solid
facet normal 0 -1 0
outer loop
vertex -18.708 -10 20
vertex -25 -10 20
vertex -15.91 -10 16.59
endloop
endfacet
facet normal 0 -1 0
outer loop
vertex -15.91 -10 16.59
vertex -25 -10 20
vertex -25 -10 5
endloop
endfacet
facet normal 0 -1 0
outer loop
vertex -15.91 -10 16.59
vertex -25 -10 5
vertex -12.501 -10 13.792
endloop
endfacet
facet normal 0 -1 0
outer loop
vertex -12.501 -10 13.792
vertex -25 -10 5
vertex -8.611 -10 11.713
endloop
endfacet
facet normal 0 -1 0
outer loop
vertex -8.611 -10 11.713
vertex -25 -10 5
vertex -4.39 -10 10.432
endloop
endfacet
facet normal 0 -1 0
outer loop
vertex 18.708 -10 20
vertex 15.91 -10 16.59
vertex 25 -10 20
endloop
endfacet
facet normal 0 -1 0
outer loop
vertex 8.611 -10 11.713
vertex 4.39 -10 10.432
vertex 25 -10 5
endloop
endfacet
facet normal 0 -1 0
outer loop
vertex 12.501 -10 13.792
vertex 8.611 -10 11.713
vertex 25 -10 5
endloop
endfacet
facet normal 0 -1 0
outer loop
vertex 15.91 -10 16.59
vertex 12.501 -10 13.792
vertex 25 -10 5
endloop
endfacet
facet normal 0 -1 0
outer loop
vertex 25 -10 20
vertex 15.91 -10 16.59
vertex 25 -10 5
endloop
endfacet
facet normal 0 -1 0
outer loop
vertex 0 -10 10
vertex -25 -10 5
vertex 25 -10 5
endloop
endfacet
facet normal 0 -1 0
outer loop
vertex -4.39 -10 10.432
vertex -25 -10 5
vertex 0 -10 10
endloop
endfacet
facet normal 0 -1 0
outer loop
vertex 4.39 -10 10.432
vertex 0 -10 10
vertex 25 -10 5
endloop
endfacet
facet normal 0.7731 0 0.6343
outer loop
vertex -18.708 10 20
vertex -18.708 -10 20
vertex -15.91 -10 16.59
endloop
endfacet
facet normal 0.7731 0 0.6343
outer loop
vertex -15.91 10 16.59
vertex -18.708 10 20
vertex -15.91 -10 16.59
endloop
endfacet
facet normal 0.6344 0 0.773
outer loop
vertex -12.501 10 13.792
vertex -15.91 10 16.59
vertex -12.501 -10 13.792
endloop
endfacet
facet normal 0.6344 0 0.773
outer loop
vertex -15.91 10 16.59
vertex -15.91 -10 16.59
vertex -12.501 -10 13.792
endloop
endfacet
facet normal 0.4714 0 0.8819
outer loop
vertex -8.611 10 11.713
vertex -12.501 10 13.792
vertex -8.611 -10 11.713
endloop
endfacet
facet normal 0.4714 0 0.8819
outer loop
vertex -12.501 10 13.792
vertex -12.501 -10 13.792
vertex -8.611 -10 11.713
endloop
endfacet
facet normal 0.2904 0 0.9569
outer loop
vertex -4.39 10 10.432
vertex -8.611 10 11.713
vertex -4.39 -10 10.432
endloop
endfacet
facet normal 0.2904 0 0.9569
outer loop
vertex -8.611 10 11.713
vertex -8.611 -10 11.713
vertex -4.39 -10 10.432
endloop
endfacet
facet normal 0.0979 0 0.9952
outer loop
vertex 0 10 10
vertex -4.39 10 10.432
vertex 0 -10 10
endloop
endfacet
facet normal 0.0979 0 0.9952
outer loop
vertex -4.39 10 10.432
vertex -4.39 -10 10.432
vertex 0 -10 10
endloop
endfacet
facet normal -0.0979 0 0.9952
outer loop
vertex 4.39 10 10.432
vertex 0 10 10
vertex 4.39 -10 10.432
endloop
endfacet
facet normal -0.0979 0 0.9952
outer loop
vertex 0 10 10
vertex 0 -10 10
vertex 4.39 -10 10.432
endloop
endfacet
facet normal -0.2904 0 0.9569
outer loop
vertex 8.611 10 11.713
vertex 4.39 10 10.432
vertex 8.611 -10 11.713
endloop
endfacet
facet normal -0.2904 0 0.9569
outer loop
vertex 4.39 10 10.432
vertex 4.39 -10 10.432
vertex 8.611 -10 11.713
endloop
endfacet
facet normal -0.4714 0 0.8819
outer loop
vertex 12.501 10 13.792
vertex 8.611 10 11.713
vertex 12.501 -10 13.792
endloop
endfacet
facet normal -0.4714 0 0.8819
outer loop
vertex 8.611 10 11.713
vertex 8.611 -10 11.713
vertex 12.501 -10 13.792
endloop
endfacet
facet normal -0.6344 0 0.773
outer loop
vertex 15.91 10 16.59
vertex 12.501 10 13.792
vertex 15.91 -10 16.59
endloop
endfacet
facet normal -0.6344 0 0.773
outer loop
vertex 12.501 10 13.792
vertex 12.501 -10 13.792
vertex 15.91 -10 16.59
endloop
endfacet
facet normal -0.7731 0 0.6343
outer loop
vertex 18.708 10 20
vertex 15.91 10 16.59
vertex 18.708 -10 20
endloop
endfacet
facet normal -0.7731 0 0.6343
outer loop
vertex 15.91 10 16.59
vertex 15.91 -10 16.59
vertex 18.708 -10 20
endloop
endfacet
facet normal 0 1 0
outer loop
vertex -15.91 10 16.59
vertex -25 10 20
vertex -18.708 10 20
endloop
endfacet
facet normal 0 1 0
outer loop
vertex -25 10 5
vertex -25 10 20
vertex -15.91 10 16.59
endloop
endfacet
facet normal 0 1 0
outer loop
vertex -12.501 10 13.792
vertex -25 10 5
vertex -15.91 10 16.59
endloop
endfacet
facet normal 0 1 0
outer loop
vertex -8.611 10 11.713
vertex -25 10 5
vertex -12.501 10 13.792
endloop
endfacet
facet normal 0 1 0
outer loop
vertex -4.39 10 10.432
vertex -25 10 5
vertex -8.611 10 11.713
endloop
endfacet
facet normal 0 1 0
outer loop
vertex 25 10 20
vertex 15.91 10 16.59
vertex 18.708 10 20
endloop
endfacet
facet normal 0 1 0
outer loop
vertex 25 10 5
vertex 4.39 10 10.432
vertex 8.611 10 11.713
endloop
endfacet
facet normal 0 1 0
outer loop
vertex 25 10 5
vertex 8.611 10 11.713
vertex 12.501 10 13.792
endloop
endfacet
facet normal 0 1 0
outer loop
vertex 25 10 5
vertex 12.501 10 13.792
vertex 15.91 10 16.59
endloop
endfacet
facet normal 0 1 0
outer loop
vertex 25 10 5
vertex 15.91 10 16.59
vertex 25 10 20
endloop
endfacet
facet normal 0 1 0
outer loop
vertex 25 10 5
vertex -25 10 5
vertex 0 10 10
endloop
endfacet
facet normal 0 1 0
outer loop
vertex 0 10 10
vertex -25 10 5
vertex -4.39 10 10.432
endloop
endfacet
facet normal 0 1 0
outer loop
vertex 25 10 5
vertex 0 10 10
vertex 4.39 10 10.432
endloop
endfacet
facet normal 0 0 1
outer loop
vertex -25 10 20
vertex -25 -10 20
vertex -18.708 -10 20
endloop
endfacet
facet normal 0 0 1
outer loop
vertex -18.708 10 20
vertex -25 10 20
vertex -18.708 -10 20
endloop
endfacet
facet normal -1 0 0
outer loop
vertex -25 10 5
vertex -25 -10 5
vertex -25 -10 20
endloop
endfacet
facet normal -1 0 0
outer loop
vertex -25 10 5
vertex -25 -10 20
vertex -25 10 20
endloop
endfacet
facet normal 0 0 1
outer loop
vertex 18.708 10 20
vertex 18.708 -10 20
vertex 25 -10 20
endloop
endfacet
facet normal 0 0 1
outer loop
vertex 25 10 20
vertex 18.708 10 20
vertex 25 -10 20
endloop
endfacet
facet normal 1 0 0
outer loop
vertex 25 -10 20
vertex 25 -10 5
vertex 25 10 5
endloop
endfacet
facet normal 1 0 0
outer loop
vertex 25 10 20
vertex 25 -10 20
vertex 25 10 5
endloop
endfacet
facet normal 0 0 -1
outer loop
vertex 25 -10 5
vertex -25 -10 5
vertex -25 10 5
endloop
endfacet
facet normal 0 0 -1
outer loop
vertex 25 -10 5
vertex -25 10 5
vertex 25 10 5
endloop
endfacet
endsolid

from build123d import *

# Parameters (mm, degrees)
F0_W     = 50
F0_H     = 20
F1_DEPTH = 20
F2_R     = 22.5
F3_DEPTH = 25
F4_W     = 50
F4_H     = 5
F5_DEPTH = 25


with BuildPart() as f1:
    # F0 (on Top) → F1 (new body)
    with BuildSketch(Plane.XY):
        Rectangle(F0_W, F0_H)
    extrude(amount=F1_DEPTH)

    # F2 (on face) → F3 (cut)
    with BuildSketch(Plane.XZ.offset(10)):
        with Locations((0, 32.5)):
            Circle(F2_R)
    extrude(amount=-F3_DEPTH, mode=Mode.SUBTRACT)

    # F4 (on face) → F5 (cut)
    with BuildSketch(Plane.XZ.offset(10)):
        with Locations((0, 2.5)):
            Rectangle(F4_W, F4_H)
    extrude(amount=-F5_DEPTH, mode=Mode.SUBTRACT)


solid = f1.part
